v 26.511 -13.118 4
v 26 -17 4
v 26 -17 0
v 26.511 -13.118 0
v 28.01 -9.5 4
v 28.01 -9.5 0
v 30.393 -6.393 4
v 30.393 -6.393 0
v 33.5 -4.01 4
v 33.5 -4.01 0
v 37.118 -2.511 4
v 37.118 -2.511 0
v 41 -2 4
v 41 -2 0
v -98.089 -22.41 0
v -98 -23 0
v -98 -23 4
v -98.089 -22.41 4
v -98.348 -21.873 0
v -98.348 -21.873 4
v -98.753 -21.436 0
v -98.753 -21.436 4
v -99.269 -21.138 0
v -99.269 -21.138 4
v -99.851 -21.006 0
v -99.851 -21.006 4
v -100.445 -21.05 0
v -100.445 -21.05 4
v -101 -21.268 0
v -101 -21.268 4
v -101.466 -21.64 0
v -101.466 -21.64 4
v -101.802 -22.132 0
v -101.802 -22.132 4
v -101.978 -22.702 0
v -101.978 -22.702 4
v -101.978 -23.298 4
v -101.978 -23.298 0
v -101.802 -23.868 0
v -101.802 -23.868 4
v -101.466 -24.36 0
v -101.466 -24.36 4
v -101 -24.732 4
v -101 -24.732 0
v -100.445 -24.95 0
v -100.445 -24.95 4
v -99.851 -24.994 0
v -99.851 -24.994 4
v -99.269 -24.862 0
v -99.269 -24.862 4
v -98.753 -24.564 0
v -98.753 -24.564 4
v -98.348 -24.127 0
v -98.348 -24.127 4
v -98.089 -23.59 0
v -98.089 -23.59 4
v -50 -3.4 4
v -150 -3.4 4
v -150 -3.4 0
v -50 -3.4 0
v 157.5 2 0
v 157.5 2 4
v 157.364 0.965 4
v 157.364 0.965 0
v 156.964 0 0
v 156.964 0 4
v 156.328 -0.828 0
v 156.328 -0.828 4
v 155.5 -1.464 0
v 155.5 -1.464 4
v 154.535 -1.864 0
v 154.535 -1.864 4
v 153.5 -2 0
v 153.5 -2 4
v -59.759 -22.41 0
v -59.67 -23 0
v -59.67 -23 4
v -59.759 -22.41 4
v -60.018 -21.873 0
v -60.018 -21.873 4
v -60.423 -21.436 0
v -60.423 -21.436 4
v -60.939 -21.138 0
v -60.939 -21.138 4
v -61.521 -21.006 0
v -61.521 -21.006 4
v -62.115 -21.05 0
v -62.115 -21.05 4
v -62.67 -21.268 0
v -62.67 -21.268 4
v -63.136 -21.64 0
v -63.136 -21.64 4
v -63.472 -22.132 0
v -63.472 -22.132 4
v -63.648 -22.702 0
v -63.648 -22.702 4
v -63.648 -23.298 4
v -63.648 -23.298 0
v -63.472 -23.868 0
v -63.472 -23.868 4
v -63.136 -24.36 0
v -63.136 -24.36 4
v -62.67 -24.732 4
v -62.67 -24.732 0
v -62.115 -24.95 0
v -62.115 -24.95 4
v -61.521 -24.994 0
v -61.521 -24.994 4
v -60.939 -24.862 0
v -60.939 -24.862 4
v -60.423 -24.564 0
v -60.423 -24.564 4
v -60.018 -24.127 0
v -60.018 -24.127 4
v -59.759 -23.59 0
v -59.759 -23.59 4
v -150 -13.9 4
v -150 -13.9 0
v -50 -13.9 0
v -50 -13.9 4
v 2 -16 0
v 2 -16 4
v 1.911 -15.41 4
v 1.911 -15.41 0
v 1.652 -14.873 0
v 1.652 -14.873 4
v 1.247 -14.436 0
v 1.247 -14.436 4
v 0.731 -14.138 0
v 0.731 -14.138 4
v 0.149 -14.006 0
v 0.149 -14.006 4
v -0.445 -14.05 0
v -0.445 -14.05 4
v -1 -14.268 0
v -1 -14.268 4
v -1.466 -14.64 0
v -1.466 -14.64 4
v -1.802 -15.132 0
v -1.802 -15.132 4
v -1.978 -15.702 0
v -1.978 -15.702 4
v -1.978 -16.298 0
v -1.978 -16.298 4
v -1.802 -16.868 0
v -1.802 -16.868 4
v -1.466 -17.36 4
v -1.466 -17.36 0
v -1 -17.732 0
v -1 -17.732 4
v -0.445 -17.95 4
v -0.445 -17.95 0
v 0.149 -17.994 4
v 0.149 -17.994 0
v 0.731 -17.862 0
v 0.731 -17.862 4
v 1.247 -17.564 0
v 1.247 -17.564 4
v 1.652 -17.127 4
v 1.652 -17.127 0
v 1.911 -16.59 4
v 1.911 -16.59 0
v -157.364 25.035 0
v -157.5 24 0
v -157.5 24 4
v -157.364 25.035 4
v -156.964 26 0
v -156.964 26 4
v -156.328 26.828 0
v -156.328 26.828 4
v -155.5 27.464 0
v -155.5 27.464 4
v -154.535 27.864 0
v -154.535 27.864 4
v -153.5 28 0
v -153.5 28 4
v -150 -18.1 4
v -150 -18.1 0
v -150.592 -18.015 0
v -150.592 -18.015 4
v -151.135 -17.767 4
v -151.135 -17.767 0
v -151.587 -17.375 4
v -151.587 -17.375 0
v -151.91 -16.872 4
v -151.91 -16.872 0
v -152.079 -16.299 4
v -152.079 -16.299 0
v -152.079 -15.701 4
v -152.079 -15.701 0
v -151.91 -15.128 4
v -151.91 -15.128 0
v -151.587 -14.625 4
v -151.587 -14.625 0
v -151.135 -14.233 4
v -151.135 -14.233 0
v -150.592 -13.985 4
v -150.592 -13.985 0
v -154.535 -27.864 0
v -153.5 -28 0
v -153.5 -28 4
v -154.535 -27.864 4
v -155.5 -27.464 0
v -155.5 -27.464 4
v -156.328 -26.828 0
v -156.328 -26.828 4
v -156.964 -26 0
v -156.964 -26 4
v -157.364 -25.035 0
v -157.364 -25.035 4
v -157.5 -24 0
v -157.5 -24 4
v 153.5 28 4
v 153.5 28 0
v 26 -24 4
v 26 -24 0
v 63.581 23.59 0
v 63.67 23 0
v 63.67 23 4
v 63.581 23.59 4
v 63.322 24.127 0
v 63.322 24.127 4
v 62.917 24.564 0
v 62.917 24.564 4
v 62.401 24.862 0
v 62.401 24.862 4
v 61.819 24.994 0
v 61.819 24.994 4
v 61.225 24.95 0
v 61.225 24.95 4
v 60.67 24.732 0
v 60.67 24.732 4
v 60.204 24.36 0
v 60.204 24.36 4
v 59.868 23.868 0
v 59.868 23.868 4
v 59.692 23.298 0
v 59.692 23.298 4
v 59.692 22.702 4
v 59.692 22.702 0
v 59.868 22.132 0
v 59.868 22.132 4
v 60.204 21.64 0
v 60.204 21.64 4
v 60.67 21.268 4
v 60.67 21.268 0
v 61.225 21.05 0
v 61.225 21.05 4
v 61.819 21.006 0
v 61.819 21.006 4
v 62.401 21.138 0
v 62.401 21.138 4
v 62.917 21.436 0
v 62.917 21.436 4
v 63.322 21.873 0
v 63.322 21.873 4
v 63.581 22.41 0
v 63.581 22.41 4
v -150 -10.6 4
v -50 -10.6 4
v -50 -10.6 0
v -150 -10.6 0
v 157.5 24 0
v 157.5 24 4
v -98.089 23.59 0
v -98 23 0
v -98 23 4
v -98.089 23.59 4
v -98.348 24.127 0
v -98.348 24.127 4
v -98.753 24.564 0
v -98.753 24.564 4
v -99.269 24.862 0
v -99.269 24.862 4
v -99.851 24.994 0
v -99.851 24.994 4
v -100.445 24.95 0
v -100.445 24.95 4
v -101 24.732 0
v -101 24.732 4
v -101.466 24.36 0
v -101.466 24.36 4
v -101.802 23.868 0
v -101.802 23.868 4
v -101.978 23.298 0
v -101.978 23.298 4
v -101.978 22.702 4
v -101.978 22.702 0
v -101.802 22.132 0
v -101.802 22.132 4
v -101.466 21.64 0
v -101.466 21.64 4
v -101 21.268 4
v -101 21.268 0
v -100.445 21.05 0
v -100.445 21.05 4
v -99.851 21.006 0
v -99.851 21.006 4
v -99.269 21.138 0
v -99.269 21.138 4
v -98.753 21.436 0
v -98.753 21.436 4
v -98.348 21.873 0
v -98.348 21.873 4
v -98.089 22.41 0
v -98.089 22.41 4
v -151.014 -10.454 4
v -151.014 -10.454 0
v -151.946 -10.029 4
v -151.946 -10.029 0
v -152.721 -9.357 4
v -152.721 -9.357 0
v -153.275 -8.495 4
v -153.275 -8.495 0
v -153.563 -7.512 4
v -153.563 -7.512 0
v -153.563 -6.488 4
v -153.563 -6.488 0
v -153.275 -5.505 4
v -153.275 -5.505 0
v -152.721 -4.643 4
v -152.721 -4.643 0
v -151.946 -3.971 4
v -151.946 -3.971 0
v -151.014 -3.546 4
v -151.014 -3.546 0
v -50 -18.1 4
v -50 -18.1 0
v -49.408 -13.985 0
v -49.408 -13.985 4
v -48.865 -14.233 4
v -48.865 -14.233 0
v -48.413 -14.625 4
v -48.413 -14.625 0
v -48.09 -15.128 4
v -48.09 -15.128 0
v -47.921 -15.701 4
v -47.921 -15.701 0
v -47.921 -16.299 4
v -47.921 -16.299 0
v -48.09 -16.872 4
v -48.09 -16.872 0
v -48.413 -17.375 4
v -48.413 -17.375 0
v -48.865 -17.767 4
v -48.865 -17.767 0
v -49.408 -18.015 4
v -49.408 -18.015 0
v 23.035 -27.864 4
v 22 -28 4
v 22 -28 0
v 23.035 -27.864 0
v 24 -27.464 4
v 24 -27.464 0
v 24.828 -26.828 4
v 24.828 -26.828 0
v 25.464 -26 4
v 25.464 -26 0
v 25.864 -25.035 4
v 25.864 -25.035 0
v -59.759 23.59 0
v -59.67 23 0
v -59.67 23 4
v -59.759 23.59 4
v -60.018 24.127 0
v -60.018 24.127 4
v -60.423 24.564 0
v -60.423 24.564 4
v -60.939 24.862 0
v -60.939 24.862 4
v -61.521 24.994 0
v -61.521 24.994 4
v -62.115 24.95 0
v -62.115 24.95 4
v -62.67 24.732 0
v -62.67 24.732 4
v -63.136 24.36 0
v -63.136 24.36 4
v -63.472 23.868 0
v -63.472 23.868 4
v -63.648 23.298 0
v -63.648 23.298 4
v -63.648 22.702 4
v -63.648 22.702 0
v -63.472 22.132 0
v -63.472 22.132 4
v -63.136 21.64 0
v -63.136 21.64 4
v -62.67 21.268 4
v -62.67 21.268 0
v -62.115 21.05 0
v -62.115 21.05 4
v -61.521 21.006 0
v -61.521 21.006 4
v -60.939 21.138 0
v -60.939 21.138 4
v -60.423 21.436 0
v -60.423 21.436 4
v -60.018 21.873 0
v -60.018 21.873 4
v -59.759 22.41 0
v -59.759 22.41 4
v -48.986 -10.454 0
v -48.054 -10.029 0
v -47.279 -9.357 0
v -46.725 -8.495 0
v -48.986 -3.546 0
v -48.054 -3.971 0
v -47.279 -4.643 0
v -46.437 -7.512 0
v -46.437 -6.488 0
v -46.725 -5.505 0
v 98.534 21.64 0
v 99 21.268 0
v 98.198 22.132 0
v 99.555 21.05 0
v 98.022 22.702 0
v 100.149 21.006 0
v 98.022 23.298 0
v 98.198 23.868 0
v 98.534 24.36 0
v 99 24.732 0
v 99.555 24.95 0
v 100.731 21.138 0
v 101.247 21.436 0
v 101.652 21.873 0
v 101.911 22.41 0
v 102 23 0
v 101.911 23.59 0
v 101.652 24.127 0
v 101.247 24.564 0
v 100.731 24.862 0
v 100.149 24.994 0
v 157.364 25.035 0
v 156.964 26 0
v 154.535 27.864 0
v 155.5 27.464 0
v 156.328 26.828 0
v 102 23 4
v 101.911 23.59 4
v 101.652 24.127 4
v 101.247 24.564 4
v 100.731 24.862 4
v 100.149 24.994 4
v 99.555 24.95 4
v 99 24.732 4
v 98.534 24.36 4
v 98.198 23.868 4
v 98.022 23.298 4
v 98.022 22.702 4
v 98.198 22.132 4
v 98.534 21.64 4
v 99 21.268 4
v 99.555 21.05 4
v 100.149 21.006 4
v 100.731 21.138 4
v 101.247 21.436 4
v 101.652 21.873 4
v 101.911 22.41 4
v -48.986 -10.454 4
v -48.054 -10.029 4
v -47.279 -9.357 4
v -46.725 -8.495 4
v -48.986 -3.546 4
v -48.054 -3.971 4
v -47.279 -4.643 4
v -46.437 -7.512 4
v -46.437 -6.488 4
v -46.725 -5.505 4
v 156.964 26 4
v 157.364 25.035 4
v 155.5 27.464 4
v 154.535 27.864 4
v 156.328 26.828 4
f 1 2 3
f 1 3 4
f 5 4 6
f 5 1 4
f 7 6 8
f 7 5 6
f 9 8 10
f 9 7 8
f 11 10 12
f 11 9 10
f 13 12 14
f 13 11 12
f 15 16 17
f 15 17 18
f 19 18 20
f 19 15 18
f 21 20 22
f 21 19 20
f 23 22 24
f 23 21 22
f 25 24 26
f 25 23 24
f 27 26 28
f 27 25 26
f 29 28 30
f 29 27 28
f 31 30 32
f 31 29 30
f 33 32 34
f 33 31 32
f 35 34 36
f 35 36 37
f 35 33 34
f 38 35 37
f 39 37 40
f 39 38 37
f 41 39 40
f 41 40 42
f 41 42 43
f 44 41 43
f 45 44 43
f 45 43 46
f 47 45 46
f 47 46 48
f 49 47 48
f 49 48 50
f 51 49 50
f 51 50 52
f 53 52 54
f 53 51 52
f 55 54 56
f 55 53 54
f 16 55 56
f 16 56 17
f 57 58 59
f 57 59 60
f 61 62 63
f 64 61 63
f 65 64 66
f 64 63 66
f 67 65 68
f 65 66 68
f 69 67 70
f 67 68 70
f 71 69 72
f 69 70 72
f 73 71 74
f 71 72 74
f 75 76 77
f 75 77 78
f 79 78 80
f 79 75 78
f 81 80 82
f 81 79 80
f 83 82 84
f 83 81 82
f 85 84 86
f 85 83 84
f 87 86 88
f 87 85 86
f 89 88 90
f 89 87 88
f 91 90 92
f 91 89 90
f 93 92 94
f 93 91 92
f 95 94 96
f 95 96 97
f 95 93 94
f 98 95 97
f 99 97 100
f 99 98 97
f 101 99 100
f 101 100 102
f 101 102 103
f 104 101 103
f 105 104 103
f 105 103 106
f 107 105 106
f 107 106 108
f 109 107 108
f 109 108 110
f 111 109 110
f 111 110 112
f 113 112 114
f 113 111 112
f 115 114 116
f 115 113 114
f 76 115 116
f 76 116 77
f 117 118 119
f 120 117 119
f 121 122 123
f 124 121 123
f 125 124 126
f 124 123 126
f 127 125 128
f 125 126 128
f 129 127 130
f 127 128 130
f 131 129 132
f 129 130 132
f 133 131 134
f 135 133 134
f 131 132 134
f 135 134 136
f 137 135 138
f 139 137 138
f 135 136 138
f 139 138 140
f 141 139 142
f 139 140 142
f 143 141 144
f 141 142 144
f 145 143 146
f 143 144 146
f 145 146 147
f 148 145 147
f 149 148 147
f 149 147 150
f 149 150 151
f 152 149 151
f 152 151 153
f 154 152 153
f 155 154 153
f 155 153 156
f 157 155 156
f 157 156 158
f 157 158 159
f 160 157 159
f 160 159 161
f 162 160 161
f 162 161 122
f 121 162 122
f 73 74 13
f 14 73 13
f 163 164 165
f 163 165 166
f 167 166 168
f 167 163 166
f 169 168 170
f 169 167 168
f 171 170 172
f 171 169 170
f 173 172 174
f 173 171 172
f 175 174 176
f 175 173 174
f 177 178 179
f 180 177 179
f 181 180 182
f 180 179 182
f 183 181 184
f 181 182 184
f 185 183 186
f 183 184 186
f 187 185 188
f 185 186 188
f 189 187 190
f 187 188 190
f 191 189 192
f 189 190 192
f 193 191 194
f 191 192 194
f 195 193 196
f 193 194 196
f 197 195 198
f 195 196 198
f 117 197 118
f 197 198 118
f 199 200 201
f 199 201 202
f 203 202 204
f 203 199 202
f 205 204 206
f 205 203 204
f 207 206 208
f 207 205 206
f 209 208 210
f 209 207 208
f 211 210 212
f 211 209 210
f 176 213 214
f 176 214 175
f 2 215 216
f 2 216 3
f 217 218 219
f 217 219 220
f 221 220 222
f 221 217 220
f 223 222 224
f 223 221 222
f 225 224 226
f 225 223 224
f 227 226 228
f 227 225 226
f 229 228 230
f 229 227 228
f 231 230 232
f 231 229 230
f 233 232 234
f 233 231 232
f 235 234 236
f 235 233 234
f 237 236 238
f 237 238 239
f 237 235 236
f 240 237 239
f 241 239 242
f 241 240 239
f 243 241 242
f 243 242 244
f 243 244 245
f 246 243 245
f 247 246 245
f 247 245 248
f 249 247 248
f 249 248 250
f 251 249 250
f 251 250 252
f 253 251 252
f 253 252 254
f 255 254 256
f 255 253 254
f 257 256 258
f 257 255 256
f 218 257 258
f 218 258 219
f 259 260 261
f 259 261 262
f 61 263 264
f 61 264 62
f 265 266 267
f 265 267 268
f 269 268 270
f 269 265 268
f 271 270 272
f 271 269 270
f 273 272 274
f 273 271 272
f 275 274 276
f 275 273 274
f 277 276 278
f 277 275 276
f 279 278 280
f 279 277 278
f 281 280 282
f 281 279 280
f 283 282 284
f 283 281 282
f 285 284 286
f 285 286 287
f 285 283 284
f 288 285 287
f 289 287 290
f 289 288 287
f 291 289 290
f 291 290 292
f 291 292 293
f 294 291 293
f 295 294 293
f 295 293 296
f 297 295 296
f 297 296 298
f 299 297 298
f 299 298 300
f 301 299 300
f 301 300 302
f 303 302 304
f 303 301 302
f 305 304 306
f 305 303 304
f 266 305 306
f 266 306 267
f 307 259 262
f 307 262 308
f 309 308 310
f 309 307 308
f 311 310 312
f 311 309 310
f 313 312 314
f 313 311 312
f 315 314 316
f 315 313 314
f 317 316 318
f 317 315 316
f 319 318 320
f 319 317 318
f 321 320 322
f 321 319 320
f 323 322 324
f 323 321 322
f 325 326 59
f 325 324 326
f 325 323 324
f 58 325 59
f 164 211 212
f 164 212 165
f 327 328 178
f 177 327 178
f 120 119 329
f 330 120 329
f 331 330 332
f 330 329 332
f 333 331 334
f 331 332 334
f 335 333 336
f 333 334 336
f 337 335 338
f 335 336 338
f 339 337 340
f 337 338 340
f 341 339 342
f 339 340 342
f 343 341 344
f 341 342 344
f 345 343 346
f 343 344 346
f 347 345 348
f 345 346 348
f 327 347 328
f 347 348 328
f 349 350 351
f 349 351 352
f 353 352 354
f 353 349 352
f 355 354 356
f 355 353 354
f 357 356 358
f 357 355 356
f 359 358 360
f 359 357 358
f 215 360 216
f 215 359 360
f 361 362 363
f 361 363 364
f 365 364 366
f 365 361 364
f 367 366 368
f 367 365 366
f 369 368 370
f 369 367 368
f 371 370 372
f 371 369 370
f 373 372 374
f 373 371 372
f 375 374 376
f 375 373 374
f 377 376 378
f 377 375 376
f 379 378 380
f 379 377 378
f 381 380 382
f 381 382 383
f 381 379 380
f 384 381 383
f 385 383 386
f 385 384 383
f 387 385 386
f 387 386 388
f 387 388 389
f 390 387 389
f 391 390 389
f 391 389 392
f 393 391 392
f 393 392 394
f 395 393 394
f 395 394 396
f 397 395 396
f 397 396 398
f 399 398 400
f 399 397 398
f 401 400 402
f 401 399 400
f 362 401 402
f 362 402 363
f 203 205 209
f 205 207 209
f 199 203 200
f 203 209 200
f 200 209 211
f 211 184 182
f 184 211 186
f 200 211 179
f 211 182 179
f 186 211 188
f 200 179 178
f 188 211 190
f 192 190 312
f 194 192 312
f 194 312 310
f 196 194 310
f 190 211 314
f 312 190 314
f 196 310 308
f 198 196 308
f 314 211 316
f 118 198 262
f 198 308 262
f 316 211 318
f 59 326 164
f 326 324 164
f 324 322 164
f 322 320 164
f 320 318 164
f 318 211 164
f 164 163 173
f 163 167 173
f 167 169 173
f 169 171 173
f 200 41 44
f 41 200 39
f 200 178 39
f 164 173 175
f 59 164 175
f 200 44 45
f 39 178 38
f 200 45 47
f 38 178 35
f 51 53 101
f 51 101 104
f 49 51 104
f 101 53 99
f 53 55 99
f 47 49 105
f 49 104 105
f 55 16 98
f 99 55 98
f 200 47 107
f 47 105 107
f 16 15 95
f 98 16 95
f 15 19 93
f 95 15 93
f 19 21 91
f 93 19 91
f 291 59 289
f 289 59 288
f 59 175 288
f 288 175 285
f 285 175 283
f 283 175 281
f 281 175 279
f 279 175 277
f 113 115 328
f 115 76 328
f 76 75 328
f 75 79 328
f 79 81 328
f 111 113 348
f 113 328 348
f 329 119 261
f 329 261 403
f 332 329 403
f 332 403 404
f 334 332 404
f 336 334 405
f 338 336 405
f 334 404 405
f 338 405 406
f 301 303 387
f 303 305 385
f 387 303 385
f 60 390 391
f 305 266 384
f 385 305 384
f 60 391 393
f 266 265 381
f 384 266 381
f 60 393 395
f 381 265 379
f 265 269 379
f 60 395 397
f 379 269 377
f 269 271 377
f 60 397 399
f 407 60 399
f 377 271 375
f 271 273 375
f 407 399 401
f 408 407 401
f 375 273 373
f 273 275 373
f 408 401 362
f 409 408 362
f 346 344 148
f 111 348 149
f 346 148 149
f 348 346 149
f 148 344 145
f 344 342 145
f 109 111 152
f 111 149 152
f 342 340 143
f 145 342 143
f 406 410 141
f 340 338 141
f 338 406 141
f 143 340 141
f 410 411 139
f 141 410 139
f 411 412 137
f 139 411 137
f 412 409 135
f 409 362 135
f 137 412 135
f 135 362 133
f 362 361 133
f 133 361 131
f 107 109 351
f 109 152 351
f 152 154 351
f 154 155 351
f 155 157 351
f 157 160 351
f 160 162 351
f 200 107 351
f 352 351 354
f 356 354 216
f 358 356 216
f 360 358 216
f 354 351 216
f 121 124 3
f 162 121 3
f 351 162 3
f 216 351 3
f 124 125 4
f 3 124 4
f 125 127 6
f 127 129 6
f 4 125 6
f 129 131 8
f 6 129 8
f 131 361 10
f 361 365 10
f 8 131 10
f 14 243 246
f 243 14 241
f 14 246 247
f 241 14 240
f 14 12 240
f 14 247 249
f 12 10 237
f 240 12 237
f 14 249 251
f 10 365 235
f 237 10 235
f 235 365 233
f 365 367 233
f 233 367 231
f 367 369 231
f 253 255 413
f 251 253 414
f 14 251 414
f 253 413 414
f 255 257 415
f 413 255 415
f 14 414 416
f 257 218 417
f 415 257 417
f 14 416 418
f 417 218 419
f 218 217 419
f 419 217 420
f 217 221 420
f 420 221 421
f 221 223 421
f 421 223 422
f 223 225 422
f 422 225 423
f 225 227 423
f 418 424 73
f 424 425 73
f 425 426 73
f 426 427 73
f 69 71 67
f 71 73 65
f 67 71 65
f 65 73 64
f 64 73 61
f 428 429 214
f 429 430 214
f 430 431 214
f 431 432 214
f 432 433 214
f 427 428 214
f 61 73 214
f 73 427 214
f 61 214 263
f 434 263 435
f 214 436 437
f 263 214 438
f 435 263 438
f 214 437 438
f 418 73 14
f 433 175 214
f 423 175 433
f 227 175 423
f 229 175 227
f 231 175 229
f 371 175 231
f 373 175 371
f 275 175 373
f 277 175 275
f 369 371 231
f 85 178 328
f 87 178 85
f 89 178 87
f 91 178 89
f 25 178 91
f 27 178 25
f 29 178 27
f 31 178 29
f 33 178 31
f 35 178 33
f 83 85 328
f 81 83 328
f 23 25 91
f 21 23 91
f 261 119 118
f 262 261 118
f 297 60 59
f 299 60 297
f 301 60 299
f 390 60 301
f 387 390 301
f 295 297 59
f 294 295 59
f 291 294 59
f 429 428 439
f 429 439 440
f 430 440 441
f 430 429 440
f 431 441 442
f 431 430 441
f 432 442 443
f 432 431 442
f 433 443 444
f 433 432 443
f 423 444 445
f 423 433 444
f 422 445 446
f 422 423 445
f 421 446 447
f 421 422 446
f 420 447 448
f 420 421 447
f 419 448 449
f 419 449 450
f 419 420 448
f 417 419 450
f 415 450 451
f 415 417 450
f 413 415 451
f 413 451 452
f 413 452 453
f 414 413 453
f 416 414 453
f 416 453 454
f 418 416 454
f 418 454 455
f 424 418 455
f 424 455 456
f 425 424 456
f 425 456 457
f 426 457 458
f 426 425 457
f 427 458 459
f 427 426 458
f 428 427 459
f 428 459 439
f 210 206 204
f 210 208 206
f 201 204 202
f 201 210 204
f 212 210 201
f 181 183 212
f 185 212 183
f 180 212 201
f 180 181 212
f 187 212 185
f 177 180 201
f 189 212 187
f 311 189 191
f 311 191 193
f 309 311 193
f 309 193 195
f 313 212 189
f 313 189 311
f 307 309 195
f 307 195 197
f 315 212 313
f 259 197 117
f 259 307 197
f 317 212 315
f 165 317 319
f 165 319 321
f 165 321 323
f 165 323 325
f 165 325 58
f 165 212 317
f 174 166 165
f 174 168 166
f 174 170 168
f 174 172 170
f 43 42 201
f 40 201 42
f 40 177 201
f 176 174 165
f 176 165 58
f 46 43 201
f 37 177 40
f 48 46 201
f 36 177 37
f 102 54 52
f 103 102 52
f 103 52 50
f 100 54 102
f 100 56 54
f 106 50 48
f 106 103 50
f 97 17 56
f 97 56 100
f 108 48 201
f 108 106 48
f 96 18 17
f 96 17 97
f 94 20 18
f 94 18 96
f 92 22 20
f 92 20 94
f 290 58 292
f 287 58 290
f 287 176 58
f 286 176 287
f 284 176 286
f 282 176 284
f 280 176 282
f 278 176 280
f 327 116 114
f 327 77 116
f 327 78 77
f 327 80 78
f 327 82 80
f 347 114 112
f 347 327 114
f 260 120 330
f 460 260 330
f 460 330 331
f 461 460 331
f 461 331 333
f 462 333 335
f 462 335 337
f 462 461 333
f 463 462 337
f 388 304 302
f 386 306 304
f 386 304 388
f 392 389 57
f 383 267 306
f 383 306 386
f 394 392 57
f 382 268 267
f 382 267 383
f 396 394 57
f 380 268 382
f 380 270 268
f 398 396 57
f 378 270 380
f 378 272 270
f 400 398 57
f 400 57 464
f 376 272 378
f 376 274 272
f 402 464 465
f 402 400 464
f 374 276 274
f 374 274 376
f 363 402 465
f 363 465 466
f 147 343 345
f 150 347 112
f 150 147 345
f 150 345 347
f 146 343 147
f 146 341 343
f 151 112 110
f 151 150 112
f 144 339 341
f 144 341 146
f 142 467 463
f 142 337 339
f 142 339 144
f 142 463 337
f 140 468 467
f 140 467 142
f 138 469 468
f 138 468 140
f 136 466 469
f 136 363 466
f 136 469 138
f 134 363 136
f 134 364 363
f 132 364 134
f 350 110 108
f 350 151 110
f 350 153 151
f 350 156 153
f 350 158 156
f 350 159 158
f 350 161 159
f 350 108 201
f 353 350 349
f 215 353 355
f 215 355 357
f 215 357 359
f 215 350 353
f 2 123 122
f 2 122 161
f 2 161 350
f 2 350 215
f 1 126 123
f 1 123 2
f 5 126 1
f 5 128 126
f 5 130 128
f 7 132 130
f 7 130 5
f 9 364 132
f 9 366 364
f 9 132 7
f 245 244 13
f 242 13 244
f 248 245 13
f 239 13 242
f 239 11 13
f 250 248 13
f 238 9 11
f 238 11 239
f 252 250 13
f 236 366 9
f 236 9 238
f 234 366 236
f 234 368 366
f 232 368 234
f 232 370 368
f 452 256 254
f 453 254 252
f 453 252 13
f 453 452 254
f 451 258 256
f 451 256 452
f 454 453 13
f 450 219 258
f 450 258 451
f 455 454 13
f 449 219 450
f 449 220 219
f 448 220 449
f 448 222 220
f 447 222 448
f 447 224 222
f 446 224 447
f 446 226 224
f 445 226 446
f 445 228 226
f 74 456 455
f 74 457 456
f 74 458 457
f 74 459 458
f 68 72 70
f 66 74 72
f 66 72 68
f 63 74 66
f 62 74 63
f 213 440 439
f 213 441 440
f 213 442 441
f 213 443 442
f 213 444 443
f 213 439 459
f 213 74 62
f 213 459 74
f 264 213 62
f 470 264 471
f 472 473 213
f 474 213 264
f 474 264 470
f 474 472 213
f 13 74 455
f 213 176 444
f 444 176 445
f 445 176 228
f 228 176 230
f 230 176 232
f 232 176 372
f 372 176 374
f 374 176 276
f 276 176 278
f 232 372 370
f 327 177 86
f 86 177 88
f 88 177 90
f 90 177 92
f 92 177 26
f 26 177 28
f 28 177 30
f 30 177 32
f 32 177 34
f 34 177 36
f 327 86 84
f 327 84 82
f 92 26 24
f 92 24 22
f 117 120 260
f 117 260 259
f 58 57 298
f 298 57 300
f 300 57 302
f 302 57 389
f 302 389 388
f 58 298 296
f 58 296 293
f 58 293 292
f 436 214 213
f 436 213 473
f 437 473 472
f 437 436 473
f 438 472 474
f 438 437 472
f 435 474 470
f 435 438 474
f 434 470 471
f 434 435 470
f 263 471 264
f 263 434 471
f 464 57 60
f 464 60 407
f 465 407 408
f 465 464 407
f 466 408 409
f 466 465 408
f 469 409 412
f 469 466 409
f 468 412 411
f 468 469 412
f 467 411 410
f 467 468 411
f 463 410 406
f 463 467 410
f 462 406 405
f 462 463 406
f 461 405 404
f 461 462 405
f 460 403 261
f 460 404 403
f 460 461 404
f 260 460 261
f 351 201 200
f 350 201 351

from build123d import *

# Parameters (mm, degrees)
SKETCH_1_R          = 2
EXTRUDE_1_DEPTH     = 4
CUT_EXTRUDE_1_DEPTH = 4
EXTRUDE_2_DEPTH     = 4
EXTRUDE_3_DEPTH     = 4
SKETCH_18_R         = 2
CUT_EXTRUDE_2_DEPTH = 5
CUT_EXTRUDE_3_DEPTH = 5


with BuildPart() as part:
    # 草图1 → 凸台-拉伸1 (new body)
    with BuildSketch(Plane.XY):
        with BuildLine():
            Line((153.5, -28), (-153.5, -28))
            ThreePointArc((-153.5, -28), (-156.328427125, -26.828427125), (-157.5, -24))
            Line((-157.5, -24), (-157.5, 24))
            ThreePointArc((-157.5, 24), (-156.328427125, 26.828427125), (-153.5, 28))
            Line((-153.5, 28), (153.5, 28))
            ThreePointArc((153.5, 28), (156.328427125, 26.828427125), (157.5, 24))
            Line((157.5, 24), (157.5, -24))
            ThreePointArc((157.5, -24), (156.328427125, -26.828427125), (153.5, -28))
        make_face()
        with Locations((-100, 23)):
            Circle(SKETCH_1_R, mode=Mode.SUBTRACT)
        with Locations((-61.67, 23)):
            Circle(SKETCH_1_R, mode=Mode.SUBTRACT)
        with Locations((-100, -23)):
            Circle(SKETCH_1_R, mode=Mode.SUBTRACT)
        with Locations((-61.67, -23)):
            Circle(SKETCH_1_R, mode=Mode.SUBTRACT)
        with Locations((100, -23)):
            Circle(SKETCH_1_R, mode=Mode.SUBTRACT)
        with Locations((61.67, -23)):
            Circle(SKETCH_1_R, mode=Mode.SUBTRACT)
        with Locations((61.67, 23)):
            Circle(SKETCH_1_R, mode=Mode.SUBTRACT)
        with Locations((100, 23)):
            Circle(SKETCH_1_R, mode=Mode.SUBTRACT)
        with BuildLine():
            Line((-150, -13.9), (-50, -13.9))
            ThreePointArc((-50, -13.9), (-47.9, -16), (-50, -18.1))
            Line((-50, -18.1), (-150, -18.1))
            ThreePointArc((-150, -18.1), (-152.1, -16), (-150, -13.9))
        make_face(mode=Mode.SUBTRACT)
    extrude(amount=EXTRUDE_1_DEPTH)

    # 草图2 → 切除-拉伸1 (cut)
    with BuildSketch(Plane.XY.offset(4)):
        with BuildLine():
            Line((0, -12), (0, -24))
            ThreePointArc((0, -24), (-1.171572875, -26.828427125), (-4, -28))
            Line((-4, -28), (0, -28))
            Line((0, -28), (157.5, -28))
            Line((157.5, -28), (157.5, -2))
            Line((157.5, -2), (157.5, 2))
            ThreePointArc((157.5, 2), (156.328427125, -0.828427125), (153.5, -2))
            Line((153.5, -2), (146.462792112, -2))
            Line((146.462792112, -2), (108, -2))
            Line((108, -2), (10, -2))
            ThreePointArc((10, -2), (2.928932188, -4.928932188), (0, -12))
        make_face()
    extrude(amount=-CUT_EXTRUDE_1_DEPTH, mode=Mode.SUBTRACT)

    # 草图3 → 凸台-拉伸2 (add)
    with BuildSketch(Plane.XY.offset(4)):
        with BuildLine():
            Line((-4, 28), (-4, -28))
            ThreePointArc((-4, -28), (-1.171572875, -26.828427125), (0, -24))
            Line((0, -24), (0, -12))
            ThreePointArc((0, -12), (2.928932188, -4.928932188), (10, -2))
            Line((10, -2), (26, -2))
            Line((26, -2), (26, 24))
            ThreePointArc((26, 24), (27.171572875, 26.828427125), (30, 28))
            Line((30, 28), (26, 28))
            Line((26, 28), (-4, 28))
        make_face()
        with BuildLine():
            ThreePointArc((0, -24), (-1.171572875, -26.828427125), (-4, -28))
            Line((-4, -28), (22, -28))
            ThreePointArc((22, -28), (24.828427125, -26.828427125), (26, -24))
            Line((26, -24), (26, -2))
            Line((26, -2), (10, -2))
            ThreePointArc((10, -2), (2.928932188, -4.928932188), (0, -12))
            Line((0, -12), (0, -24))
        make_face()
    extrude(amount=-EXTRUDE_2_DEPTH)

    # 草图17 → 凸台-拉伸3 (add)
    with BuildSketch(Plane.XY.offset(4)):
        with BuildLine():
            Line((26, -2), (26, -8.742458912))
            Line((26, -8.742458912), (26, -17))
            ThreePointArc((26, -17), (30.393398282, -6.393398282), (41, -2))
            Line((41, -2), (26, -2))
        make_face()
    extrude(amount=-EXTRUDE_3_DEPTH)

    # 草图18 → 切除-拉伸2 (cut, through all)
    with BuildSketch(Plane.XY.offset(4)):
        with Locations((0, -16)):
            Circle(SKETCH_18_R)
    extrude(amount=-CUT_EXTRUDE_2_DEPTH, mode=Mode.SUBTRACT)

    # 草图19 → 切除-拉伸3 (cut, through all)
    with BuildSketch(Plane.XY.offset(4)):
        with BuildLine():
            Line((-50, -10.6), (-150, -10.6))
            ThreePointArc((-150, -10.6), (-153.6, -7), (-150, -3.4))
            Line((-150, -3.4), (-50, -3.4))
            ThreePointArc((-50, -3.4), (-46.4, -7), (-50, -10.6))
        make_face()
    extrude(amount=-CUT_EXTRUDE_3_DEPTH, mode=Mode.SUBTRACT)


solid = part.part
